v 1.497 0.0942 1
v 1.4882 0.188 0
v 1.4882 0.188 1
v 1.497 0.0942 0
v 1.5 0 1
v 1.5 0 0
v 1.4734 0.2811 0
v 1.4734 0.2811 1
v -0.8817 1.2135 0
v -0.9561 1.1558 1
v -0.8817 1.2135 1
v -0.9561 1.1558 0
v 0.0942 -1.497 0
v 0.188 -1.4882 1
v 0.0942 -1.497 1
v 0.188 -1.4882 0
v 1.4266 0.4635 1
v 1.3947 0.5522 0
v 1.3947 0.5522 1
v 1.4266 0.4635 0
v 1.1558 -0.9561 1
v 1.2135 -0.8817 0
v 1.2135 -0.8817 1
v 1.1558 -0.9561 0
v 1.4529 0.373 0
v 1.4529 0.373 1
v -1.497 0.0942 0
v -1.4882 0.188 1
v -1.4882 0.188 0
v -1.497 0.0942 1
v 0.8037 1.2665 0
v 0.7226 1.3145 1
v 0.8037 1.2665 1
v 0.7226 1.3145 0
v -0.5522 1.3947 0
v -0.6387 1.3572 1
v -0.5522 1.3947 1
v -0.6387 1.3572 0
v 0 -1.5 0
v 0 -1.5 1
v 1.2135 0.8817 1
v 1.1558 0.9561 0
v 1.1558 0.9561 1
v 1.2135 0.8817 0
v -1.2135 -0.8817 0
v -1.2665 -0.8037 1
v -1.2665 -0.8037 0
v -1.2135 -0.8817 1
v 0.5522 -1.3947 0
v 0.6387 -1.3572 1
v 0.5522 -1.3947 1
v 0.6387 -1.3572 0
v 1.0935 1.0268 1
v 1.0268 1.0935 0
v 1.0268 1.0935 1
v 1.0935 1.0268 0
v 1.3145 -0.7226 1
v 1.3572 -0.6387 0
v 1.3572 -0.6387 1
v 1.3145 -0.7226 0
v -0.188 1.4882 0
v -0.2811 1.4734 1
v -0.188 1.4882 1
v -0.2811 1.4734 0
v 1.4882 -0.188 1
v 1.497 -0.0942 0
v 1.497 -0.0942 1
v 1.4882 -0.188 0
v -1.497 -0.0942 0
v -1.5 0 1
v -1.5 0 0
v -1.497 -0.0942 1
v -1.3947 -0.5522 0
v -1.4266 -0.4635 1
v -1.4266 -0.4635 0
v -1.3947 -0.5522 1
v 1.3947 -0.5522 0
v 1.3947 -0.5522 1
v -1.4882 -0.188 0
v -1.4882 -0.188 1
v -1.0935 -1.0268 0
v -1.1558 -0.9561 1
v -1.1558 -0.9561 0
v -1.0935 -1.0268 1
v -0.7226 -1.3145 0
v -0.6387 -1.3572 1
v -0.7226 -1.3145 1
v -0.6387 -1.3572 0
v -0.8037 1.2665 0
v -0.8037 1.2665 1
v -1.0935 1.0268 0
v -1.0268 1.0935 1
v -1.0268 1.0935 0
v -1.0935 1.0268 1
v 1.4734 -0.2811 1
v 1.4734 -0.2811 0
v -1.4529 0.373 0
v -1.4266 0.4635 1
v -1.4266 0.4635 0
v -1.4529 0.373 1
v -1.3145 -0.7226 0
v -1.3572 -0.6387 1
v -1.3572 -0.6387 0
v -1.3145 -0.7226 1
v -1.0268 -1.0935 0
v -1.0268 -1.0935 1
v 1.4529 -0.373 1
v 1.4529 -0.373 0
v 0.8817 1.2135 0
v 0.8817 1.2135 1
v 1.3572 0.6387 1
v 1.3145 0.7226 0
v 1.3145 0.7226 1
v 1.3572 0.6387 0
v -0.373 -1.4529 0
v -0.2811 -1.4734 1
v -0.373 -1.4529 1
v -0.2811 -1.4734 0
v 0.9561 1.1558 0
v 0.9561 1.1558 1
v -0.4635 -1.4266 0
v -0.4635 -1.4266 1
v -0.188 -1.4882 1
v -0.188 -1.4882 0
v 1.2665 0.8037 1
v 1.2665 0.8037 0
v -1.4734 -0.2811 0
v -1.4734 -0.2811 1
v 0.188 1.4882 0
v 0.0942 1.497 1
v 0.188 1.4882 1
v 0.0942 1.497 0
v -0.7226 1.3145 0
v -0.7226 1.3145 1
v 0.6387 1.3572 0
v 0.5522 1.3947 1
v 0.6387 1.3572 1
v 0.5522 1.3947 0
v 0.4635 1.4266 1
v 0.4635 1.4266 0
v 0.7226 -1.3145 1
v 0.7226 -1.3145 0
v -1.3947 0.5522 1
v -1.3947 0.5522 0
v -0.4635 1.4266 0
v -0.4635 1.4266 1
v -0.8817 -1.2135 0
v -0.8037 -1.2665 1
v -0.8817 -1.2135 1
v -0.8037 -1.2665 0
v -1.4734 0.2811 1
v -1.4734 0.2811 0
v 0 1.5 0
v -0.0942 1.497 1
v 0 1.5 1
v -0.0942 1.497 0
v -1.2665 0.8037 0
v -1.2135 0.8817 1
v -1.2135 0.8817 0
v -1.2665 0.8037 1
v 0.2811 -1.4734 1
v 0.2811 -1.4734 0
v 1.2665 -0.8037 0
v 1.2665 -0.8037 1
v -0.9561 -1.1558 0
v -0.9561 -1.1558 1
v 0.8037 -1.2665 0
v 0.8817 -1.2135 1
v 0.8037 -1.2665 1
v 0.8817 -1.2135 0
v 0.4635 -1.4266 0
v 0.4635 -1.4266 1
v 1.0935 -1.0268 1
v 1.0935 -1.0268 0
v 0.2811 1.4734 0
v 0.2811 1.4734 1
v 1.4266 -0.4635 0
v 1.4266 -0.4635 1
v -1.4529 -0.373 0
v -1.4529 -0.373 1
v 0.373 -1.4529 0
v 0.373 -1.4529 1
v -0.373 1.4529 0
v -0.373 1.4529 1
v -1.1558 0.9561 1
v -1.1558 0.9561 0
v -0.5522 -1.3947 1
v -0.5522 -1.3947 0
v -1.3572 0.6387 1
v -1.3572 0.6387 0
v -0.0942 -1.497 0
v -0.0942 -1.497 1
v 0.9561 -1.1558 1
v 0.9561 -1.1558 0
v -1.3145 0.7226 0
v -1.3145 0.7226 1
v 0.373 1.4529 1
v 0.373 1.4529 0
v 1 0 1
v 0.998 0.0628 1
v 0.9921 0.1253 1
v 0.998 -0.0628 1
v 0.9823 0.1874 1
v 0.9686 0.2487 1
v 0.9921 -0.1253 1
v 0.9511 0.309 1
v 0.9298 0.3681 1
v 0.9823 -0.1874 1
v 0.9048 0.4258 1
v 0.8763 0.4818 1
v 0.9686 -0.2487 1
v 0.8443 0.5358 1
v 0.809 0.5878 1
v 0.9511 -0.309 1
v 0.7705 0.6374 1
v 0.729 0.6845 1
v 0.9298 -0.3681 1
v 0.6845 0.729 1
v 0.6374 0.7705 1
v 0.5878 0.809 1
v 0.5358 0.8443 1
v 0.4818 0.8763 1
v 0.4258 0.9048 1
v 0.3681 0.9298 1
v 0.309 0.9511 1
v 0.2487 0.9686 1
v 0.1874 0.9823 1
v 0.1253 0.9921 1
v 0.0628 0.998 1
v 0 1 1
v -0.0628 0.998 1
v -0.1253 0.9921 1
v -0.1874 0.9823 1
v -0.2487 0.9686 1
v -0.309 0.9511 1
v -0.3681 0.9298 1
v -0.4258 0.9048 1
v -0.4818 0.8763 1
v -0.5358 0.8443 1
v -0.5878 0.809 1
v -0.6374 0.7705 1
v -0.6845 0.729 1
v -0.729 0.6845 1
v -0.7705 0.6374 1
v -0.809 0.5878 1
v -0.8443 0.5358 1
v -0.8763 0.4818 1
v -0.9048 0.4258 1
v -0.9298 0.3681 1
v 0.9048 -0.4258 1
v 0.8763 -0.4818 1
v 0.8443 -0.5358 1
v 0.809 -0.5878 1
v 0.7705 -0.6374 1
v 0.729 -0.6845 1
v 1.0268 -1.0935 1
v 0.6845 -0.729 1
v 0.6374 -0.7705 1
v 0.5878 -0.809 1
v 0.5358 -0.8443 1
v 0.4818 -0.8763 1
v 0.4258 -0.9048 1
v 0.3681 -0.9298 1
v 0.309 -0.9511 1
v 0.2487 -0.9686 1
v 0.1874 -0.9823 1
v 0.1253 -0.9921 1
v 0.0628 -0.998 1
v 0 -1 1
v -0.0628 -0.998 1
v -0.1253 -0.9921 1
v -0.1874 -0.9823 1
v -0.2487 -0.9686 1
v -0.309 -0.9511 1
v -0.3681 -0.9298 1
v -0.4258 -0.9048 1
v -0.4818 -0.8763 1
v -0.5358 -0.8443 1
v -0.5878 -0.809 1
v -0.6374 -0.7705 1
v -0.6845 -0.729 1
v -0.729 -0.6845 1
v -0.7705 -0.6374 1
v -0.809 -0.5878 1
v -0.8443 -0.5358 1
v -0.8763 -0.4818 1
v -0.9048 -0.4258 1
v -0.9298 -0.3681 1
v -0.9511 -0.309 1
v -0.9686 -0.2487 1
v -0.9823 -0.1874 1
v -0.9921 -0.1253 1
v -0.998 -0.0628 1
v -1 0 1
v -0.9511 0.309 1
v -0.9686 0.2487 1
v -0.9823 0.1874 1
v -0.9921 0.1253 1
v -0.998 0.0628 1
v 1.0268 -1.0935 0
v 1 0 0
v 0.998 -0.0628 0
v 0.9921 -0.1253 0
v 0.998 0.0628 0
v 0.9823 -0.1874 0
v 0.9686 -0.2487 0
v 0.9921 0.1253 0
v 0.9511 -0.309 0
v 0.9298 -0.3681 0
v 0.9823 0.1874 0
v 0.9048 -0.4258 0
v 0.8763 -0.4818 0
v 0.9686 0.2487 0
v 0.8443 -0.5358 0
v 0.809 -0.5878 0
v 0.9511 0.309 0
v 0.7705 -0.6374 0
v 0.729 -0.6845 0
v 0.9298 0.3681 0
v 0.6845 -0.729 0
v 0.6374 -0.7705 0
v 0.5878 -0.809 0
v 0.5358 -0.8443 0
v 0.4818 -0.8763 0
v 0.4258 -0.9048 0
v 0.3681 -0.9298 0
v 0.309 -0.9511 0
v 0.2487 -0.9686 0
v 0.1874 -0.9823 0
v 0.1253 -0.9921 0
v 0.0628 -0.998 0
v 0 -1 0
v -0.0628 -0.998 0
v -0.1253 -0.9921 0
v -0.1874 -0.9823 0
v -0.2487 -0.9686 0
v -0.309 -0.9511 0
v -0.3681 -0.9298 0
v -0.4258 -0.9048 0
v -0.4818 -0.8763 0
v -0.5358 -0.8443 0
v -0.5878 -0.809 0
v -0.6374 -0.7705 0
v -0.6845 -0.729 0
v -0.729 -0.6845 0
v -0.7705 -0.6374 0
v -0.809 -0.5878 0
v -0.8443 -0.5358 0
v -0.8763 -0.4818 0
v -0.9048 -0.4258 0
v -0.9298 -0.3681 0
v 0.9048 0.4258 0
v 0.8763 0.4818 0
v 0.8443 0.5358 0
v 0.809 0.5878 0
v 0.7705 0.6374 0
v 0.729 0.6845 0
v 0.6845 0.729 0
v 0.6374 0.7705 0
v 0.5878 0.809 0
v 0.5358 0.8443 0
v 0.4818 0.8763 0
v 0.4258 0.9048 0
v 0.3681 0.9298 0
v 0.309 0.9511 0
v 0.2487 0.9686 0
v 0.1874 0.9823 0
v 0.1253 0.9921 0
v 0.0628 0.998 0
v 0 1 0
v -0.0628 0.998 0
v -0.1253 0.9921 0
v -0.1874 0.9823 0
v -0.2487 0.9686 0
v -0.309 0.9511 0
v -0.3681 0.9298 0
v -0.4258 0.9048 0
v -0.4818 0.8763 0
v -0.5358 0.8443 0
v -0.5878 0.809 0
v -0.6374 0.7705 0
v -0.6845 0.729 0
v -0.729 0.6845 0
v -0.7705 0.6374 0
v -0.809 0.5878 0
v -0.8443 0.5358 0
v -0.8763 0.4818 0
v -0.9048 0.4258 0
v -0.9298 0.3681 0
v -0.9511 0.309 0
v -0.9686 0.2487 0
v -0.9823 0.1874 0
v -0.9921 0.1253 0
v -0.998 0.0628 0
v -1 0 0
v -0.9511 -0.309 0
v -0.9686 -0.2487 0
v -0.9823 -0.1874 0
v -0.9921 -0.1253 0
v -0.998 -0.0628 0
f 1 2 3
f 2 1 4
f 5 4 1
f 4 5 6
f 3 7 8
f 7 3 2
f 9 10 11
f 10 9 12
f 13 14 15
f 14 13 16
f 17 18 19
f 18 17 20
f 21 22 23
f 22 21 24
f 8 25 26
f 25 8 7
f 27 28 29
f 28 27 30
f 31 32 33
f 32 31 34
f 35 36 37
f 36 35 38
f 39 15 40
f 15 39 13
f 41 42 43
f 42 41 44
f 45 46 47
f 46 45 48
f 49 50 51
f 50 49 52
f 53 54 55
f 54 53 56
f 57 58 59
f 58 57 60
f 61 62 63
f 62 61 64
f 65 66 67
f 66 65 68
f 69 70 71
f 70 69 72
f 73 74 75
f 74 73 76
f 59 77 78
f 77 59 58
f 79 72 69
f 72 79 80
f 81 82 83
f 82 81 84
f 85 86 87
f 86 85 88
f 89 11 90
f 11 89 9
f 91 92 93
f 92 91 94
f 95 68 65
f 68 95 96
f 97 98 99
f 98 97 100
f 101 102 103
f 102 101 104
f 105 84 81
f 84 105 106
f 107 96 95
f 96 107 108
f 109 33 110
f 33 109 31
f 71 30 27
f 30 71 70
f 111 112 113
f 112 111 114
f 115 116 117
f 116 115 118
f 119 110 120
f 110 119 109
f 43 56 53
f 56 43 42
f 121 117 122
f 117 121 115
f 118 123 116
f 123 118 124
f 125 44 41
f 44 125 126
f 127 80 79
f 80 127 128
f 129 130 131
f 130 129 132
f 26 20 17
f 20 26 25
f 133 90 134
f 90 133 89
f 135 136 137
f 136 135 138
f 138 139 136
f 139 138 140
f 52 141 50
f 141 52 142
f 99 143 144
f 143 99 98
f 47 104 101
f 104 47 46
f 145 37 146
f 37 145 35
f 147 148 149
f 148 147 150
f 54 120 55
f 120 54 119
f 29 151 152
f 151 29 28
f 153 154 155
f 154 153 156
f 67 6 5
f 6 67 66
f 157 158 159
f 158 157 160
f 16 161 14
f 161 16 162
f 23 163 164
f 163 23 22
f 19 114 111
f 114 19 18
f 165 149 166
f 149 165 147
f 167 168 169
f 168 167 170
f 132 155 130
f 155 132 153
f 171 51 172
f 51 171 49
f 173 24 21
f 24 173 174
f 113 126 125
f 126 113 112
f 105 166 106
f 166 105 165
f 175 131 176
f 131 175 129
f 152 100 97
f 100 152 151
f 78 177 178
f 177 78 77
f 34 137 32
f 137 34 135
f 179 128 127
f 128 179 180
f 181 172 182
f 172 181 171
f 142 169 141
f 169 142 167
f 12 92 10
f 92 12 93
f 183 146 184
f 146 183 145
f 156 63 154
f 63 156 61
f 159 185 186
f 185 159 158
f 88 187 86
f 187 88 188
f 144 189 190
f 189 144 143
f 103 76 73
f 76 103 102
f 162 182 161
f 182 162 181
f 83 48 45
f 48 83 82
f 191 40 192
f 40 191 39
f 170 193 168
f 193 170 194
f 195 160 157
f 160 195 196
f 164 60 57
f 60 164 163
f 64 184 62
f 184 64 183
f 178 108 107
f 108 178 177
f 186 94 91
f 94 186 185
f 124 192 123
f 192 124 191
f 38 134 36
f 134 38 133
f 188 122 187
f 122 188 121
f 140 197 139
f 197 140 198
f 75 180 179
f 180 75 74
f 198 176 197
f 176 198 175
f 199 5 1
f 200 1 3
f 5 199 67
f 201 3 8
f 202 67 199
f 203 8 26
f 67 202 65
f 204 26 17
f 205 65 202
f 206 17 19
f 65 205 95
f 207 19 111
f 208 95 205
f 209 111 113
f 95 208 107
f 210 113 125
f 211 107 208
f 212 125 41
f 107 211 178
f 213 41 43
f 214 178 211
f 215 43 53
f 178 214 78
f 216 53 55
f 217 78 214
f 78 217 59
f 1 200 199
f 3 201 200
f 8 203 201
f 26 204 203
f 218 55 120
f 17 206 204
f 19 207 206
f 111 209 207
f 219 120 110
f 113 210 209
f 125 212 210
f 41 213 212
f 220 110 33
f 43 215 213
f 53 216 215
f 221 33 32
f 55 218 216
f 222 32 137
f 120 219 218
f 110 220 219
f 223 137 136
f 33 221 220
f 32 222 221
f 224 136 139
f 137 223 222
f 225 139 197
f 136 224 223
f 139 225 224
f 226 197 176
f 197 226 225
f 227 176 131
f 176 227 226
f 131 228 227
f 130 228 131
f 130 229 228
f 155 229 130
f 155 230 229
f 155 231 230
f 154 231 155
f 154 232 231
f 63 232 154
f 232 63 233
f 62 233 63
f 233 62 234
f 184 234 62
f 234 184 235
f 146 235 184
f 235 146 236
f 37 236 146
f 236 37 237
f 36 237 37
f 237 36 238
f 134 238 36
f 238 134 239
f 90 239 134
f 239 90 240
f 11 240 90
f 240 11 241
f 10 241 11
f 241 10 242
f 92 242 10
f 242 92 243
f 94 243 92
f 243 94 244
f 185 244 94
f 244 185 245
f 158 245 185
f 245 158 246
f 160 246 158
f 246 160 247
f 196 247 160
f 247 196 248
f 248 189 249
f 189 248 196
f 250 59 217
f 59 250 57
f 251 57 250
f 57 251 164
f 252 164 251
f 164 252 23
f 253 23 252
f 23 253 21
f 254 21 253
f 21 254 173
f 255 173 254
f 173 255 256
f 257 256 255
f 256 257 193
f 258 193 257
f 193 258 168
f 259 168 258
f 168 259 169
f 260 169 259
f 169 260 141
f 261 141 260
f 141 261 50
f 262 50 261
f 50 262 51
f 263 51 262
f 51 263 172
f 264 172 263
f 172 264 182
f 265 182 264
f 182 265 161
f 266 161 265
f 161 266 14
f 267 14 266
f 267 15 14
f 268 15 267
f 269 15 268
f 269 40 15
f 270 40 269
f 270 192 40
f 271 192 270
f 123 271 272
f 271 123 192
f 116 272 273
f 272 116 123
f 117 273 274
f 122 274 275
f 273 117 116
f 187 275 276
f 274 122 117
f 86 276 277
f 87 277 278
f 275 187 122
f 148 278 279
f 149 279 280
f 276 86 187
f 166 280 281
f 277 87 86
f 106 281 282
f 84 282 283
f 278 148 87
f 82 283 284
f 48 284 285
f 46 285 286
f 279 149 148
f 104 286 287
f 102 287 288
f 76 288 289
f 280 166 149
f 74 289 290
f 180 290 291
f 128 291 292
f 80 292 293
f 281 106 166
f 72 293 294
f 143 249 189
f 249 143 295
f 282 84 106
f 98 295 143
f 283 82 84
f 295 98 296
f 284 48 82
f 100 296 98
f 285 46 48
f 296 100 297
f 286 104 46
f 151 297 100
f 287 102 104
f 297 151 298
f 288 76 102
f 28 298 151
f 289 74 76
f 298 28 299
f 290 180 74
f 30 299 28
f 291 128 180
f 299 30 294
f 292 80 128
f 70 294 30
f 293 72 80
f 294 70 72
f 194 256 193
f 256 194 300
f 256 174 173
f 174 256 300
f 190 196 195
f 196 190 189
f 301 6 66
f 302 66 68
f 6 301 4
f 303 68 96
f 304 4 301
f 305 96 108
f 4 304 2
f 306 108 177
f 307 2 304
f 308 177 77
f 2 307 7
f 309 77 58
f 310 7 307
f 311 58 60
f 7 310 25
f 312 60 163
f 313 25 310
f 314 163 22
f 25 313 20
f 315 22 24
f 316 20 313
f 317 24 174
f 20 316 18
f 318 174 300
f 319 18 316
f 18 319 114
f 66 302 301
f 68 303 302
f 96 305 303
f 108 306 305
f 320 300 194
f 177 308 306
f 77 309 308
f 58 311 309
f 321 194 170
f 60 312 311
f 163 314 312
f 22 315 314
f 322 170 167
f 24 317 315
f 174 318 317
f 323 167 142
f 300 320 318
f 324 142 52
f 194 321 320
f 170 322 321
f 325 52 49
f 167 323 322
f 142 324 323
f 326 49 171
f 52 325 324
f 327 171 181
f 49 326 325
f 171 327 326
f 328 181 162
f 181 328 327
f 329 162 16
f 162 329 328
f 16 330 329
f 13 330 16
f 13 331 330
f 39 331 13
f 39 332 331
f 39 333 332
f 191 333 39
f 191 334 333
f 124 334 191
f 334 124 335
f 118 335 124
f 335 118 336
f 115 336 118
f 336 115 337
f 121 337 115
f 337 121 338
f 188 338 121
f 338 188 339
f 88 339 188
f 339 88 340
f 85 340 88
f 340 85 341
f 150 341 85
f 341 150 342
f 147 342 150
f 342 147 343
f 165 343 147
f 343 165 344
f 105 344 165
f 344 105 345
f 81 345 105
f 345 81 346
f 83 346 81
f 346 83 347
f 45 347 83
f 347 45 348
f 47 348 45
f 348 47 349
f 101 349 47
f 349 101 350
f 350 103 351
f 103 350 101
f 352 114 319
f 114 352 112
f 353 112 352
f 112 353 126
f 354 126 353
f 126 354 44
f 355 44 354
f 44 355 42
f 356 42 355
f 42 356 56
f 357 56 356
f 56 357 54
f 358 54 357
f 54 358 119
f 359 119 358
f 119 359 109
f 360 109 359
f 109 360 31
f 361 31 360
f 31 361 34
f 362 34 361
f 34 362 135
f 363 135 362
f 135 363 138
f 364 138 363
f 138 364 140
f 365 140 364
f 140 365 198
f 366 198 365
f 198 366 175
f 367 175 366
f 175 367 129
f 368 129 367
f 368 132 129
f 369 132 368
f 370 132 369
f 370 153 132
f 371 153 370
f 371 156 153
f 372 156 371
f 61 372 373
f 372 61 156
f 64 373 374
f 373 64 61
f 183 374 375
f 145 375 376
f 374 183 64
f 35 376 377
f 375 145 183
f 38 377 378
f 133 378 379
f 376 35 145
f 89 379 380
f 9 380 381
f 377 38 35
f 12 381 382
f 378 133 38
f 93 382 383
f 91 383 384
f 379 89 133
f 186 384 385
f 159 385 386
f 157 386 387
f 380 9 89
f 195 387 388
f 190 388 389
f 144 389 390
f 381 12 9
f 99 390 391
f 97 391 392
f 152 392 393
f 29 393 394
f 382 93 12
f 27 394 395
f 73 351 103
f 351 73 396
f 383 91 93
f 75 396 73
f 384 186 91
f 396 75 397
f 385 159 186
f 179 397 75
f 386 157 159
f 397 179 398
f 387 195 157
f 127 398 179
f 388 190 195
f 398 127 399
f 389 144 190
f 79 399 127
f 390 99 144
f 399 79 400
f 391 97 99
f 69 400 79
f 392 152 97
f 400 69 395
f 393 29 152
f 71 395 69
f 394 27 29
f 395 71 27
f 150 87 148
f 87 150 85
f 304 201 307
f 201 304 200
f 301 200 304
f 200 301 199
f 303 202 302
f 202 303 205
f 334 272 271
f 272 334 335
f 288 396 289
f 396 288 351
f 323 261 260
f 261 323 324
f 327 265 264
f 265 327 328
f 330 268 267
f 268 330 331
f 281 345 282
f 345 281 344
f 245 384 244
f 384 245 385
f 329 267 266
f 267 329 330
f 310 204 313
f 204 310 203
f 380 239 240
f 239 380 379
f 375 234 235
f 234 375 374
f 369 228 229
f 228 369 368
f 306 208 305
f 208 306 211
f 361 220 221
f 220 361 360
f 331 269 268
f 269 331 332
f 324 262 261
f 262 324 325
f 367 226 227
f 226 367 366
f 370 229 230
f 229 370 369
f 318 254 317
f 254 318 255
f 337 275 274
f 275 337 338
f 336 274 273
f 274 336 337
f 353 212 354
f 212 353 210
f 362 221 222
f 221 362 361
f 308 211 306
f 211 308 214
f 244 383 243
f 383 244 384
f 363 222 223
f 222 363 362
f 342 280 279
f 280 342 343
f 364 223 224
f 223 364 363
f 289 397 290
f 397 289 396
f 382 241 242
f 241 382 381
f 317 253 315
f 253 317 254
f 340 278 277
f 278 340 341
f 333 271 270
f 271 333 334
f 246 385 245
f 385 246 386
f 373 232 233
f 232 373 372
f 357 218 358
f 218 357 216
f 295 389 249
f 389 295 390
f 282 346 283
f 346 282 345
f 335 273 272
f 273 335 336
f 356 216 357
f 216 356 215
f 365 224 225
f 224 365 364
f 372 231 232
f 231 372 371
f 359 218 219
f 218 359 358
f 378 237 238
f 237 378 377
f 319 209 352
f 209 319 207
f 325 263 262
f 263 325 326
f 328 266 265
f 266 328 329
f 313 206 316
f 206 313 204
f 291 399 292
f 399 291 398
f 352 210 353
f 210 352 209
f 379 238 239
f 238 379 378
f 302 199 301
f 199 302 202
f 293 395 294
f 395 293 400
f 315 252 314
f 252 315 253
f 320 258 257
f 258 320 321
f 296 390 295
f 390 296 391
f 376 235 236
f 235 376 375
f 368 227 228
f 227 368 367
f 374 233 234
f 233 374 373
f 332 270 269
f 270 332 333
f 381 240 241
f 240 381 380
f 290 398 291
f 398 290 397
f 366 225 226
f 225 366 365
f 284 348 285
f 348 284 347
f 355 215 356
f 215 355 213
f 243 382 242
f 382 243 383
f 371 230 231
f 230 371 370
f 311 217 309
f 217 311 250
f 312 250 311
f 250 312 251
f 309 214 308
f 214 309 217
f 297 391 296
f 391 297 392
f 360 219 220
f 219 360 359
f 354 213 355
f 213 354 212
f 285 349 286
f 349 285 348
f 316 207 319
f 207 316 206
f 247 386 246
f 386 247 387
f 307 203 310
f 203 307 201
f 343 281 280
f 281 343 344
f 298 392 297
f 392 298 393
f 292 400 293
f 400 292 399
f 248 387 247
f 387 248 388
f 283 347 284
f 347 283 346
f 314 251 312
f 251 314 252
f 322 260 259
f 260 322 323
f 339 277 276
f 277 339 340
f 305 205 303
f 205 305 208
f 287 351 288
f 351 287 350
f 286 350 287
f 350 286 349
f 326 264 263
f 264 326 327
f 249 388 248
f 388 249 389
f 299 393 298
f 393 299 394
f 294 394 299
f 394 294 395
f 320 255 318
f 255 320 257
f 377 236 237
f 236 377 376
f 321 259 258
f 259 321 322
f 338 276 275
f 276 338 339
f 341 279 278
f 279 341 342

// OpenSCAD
$fn = 100;  // render quality

// Variables

plate_height = 3;
plate_width = 30;
plate_length = 100;

body_screw_hole_radius = 1.0+0.1;  //screw M2
body_screw_holes_space = 20;
motors_distance = 80;

cpu_screw_hole_radius = 1.0+0.1;  //screw M2
cpu_screw_hole_space = 20;

// MODULES

module RoundSpacer(height=3, outside_radius=4, inside_radius=2){
    translate([0,0,height/2]) {
        difference() {
            cylinder(height, outside_radius/2, outside_radius/2, true);
            cylinder(height*2, inside_radius/2, inside_radius/2, true);
        }
    }
}

module CircuitCPU(){
    translate([0,0,0.5]) {
        difference() {
            cube([25,25,1], true);
            translate([-10,10,0]) {
                cylinder(5, 2, 1, true);
            }
            translate([-10,-10,0]) {
                cylinder(5, 2, 1, true);
            }
            translate([10,10,0]) {
                cylinder(5, 2, 1, true);
            }
            translate([10,-10,0]) {
                cylinder(5, 2, 1, true);
            }
        }
    }
}

module CircuitCPU(){
    translate([0,0,0.5]) {
        difference() {
            cube([25,25,1], true);
            translate([-10,10,0]) {
                cylinder(5, 1, 1, true);
            }
            translate([-10,-10,0]) {
                cylinder(5, 1, 1, true);
            }
            translate([10,10,0]) {
                cylinder(5, 1, 1, true);
            }
            translate([10,-10,0]) {
                cylinder(5, 1, 1, true);
            }
        }
    }
}

module CircuitReceiver(){
    translate([0,0,0.5]) {
        difference() {
            cube([36,22,7.5], true);
            translate([-15,8,0]) {
                cylinder(10, 1, 1, true);
            }
            translate([15,8,0]) {
                cylinder(10, 1, 1, true);
            }
        }
    }
}

//CircuitReceiver();

translate([0,60,0]) {
    //CircuitCPU();
}

translate([40,0,0]) {
    //RoundSpacer();
}

RoundSpacer(1, 3, 2);
